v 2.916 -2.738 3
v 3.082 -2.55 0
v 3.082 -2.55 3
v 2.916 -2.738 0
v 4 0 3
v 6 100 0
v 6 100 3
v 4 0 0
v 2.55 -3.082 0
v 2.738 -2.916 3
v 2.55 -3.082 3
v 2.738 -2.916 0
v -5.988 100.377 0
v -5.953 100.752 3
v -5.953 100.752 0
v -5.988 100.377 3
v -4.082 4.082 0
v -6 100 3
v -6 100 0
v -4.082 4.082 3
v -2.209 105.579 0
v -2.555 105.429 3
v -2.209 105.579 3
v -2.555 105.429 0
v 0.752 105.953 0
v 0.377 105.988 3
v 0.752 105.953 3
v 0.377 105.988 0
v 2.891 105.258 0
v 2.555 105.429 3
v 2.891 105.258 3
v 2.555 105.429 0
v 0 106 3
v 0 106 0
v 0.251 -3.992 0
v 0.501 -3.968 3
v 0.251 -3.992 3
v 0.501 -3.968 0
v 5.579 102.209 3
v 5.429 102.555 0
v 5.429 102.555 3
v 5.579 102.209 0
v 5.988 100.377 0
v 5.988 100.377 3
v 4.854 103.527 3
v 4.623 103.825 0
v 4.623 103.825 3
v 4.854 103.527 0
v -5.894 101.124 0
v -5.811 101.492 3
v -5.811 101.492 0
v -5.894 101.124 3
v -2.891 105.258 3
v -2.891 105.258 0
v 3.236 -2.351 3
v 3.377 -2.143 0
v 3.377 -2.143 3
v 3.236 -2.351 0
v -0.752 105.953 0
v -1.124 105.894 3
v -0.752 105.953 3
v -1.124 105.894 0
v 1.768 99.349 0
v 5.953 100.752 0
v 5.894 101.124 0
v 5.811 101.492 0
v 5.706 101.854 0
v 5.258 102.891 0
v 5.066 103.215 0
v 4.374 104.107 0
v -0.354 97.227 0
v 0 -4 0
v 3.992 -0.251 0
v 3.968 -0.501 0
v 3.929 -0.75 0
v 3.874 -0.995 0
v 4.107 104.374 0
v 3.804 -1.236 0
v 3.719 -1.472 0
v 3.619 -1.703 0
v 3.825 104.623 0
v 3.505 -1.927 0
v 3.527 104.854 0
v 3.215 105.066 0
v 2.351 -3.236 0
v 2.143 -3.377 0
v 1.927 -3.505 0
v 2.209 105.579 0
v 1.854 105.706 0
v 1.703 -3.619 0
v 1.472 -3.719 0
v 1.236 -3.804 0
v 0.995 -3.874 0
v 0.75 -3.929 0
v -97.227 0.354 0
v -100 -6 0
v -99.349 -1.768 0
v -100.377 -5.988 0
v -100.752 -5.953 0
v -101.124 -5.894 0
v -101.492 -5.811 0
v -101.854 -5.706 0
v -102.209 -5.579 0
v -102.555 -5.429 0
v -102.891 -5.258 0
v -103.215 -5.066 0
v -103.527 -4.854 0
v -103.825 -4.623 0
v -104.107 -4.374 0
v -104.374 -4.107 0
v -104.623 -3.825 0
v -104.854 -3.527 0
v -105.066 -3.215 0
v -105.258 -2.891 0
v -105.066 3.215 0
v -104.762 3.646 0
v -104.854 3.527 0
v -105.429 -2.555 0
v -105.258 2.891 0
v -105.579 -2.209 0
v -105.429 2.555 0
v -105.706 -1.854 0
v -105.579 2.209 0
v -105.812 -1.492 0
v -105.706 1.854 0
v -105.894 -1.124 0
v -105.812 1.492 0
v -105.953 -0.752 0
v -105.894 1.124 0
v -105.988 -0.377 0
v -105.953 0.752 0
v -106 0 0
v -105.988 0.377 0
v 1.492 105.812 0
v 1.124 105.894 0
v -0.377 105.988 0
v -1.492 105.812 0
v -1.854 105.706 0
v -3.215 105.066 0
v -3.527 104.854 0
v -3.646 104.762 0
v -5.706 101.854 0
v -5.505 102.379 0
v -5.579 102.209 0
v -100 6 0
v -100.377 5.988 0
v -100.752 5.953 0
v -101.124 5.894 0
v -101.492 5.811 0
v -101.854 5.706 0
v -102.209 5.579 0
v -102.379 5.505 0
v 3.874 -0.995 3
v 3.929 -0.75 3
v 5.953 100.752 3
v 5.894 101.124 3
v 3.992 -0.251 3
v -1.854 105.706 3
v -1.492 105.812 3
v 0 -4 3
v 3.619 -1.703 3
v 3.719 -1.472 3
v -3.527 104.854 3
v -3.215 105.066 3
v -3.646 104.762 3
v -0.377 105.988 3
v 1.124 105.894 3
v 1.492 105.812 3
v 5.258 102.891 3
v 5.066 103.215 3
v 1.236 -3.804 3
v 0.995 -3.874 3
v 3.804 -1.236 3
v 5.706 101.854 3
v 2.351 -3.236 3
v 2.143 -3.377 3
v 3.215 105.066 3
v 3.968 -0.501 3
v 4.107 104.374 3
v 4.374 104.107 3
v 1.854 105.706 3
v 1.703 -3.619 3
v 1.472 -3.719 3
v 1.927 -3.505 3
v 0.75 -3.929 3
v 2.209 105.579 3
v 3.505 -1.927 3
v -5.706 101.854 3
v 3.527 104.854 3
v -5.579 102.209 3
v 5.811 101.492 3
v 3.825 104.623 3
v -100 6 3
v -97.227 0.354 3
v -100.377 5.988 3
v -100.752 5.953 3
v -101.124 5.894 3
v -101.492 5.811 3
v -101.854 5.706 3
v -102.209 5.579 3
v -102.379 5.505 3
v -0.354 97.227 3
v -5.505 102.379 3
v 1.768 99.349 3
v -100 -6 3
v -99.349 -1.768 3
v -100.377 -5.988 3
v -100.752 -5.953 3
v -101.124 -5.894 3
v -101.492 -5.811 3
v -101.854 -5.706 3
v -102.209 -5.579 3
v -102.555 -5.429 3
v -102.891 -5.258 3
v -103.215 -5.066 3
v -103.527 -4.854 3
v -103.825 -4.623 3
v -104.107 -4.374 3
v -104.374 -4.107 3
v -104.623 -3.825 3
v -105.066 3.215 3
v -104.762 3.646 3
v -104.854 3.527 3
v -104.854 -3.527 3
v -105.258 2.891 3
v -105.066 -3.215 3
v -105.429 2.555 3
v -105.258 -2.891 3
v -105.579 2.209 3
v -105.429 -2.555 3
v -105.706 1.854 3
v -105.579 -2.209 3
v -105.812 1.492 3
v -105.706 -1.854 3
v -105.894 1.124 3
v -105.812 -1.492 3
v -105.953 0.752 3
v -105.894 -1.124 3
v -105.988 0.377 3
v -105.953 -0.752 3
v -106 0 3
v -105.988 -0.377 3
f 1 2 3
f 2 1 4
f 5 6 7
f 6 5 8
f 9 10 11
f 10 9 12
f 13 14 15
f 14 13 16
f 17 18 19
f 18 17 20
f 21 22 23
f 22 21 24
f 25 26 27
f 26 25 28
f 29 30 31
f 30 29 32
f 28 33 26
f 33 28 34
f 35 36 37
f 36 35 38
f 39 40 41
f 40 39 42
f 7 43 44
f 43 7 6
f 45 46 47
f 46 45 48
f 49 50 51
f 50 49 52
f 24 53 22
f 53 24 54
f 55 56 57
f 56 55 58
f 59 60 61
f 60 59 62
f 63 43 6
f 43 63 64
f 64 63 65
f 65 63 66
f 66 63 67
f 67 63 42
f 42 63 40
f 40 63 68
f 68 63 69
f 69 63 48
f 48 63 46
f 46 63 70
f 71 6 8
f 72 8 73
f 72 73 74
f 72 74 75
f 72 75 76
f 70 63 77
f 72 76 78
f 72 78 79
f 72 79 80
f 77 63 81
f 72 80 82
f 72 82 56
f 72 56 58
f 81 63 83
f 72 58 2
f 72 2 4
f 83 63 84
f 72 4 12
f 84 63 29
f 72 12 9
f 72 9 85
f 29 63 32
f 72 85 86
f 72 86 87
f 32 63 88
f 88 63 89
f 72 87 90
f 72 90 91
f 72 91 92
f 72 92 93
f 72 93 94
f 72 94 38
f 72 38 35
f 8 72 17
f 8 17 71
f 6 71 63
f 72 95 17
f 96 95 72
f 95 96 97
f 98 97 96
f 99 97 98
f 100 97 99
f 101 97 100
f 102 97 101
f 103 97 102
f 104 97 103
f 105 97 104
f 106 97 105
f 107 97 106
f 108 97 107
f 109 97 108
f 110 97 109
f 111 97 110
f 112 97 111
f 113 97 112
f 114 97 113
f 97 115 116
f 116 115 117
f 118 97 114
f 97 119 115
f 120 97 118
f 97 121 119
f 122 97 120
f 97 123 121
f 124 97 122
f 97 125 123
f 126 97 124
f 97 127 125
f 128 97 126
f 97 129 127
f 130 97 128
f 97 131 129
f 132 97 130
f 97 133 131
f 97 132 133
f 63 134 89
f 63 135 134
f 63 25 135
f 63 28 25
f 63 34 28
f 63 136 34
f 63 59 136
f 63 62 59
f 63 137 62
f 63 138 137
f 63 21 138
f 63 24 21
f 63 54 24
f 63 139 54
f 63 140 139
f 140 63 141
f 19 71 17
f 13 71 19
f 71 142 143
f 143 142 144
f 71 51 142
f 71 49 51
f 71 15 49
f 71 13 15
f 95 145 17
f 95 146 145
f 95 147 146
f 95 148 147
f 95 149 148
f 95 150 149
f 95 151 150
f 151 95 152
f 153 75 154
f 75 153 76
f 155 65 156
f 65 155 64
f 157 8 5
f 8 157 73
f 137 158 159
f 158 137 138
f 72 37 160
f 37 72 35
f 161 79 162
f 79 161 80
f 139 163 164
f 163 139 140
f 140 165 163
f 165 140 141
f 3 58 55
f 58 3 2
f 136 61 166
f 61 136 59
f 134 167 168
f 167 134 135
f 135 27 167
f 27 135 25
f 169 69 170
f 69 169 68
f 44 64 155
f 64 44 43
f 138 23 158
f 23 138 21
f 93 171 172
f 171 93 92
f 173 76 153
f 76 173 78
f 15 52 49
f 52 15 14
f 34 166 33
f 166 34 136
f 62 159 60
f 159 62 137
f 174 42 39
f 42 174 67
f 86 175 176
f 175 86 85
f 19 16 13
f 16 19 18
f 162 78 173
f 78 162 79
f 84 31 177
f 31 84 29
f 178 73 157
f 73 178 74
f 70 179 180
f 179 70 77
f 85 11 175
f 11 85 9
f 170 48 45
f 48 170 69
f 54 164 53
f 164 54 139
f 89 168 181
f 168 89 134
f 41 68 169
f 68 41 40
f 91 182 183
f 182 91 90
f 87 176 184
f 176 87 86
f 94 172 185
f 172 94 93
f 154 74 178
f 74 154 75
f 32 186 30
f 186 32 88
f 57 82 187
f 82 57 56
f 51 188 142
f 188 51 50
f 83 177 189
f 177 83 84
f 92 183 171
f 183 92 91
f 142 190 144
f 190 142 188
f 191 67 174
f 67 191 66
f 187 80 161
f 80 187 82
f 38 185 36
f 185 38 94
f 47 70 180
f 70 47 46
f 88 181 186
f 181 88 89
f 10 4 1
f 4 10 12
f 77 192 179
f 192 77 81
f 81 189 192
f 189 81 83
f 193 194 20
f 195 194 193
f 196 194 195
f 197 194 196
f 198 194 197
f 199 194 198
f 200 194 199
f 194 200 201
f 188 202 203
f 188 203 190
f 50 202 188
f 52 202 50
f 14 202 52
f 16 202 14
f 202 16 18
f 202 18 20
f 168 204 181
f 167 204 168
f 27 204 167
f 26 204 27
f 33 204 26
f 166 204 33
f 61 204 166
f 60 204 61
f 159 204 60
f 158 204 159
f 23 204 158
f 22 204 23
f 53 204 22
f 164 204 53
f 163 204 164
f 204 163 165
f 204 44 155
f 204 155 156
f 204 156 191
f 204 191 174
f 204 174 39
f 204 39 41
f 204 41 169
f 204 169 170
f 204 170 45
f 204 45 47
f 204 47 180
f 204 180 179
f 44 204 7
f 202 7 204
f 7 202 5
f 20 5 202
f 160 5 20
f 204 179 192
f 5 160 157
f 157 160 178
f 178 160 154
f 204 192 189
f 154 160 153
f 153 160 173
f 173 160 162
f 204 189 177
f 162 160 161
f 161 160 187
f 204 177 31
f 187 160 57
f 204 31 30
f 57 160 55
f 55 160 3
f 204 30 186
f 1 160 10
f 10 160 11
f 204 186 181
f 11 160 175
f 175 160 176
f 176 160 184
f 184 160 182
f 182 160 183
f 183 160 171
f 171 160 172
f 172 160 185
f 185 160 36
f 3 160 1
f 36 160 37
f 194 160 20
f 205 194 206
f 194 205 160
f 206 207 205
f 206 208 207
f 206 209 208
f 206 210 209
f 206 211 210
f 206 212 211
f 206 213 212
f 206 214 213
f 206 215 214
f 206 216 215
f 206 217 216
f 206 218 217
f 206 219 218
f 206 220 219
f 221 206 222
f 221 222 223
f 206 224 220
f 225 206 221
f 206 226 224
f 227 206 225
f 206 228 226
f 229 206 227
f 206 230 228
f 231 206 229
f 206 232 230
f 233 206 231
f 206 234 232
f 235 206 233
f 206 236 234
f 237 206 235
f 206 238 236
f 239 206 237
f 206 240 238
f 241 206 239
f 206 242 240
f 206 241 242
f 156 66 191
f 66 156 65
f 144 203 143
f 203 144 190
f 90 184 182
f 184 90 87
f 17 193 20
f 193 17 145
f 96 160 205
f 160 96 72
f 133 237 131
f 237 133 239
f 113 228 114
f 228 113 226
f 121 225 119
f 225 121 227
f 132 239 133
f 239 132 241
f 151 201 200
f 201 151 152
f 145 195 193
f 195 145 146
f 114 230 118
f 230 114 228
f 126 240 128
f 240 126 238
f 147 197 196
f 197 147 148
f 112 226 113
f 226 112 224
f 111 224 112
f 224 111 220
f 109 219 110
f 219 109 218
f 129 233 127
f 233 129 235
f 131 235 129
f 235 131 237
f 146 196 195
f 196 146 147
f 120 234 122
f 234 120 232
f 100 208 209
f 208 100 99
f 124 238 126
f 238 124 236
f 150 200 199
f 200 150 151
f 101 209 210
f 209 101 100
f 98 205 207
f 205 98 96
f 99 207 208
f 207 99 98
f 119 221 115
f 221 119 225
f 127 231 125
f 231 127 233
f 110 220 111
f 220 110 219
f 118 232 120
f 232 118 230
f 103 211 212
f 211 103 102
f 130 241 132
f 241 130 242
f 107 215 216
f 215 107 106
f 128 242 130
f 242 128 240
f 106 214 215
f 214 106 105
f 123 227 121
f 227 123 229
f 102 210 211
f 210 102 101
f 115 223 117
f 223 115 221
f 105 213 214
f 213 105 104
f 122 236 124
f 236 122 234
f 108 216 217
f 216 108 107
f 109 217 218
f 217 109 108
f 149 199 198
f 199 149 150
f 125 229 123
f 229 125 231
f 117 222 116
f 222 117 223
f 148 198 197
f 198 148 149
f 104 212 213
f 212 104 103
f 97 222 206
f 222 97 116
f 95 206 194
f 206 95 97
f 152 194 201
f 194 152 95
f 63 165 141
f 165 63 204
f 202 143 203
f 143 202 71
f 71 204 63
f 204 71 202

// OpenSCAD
/*
	some info
*/


//	variables
QUALITY = 100;
RADIUS = 2;
MULTI = 1;
THICKNESS = 3;

// tests
module arm(){
	difference(){
	union(){
		color("green")hull(){
			translate([0,0,0])cylinder(h=THICKNESS, r=(RADIUS+MULTI), $fn=QUALITY);
			translate([70,0,0])cylinder(h=THICKNESS, r=RADIUS, $fn=QUALITY);
			translate([100,10,0])cylinder(h=THICKNESS, r=RADIUS, $fn=QUALITY);
		}
		color("cyan")hull(){
			translate([3,10,0])cylinder(h=THICKNESS, r=RADIUS, $fn=QUALITY);
			translate([0,0,0])cylinder(h=THICKNESS, r=(RADIUS+MULTI), $fn=QUALITY);
		}
	}
	color("red")translate([60,0,(THICKNESS-THICKNESS*1.5)])rotate([0,0,140])cube([THICKNESS, (THICKNESS*2), (THICKNESS*2)]);
	}
}

module cutout(x,y,z=(THICKNESS-THICKNESS*1.5)){
	translate([x,y,(z*1.2)])cube([THICKNESS, (THICKNESS*4), (THICKNESS*4)], center=true);
}

module try(){
	hull(){
		translate([0,0,0])cylinder(h=THICKNESS, r=(RADIUS*2), $fn=QUALITY);
		translate([0,100,0])cylinder(h=THICKNESS, r=(RADIUS*3), $fn=QUALITY);
	}
}
module tripod(z){
difference(){
	color("green"){
		rotate([0,0,0])try();
		//rotate([0,0,225])try();
		rotate([0,0,90])try();
	}
	color("yellow")rotate([0,0,45]){cutout(-70,75,z);}
	color("yellow")rotate([0,0,45]){cutout(70,75,z);}
	}
}

module render(){
	//arm();
	//translate([0,20,0])arm();
	translate([0,0])tripod(0);
}
render();
